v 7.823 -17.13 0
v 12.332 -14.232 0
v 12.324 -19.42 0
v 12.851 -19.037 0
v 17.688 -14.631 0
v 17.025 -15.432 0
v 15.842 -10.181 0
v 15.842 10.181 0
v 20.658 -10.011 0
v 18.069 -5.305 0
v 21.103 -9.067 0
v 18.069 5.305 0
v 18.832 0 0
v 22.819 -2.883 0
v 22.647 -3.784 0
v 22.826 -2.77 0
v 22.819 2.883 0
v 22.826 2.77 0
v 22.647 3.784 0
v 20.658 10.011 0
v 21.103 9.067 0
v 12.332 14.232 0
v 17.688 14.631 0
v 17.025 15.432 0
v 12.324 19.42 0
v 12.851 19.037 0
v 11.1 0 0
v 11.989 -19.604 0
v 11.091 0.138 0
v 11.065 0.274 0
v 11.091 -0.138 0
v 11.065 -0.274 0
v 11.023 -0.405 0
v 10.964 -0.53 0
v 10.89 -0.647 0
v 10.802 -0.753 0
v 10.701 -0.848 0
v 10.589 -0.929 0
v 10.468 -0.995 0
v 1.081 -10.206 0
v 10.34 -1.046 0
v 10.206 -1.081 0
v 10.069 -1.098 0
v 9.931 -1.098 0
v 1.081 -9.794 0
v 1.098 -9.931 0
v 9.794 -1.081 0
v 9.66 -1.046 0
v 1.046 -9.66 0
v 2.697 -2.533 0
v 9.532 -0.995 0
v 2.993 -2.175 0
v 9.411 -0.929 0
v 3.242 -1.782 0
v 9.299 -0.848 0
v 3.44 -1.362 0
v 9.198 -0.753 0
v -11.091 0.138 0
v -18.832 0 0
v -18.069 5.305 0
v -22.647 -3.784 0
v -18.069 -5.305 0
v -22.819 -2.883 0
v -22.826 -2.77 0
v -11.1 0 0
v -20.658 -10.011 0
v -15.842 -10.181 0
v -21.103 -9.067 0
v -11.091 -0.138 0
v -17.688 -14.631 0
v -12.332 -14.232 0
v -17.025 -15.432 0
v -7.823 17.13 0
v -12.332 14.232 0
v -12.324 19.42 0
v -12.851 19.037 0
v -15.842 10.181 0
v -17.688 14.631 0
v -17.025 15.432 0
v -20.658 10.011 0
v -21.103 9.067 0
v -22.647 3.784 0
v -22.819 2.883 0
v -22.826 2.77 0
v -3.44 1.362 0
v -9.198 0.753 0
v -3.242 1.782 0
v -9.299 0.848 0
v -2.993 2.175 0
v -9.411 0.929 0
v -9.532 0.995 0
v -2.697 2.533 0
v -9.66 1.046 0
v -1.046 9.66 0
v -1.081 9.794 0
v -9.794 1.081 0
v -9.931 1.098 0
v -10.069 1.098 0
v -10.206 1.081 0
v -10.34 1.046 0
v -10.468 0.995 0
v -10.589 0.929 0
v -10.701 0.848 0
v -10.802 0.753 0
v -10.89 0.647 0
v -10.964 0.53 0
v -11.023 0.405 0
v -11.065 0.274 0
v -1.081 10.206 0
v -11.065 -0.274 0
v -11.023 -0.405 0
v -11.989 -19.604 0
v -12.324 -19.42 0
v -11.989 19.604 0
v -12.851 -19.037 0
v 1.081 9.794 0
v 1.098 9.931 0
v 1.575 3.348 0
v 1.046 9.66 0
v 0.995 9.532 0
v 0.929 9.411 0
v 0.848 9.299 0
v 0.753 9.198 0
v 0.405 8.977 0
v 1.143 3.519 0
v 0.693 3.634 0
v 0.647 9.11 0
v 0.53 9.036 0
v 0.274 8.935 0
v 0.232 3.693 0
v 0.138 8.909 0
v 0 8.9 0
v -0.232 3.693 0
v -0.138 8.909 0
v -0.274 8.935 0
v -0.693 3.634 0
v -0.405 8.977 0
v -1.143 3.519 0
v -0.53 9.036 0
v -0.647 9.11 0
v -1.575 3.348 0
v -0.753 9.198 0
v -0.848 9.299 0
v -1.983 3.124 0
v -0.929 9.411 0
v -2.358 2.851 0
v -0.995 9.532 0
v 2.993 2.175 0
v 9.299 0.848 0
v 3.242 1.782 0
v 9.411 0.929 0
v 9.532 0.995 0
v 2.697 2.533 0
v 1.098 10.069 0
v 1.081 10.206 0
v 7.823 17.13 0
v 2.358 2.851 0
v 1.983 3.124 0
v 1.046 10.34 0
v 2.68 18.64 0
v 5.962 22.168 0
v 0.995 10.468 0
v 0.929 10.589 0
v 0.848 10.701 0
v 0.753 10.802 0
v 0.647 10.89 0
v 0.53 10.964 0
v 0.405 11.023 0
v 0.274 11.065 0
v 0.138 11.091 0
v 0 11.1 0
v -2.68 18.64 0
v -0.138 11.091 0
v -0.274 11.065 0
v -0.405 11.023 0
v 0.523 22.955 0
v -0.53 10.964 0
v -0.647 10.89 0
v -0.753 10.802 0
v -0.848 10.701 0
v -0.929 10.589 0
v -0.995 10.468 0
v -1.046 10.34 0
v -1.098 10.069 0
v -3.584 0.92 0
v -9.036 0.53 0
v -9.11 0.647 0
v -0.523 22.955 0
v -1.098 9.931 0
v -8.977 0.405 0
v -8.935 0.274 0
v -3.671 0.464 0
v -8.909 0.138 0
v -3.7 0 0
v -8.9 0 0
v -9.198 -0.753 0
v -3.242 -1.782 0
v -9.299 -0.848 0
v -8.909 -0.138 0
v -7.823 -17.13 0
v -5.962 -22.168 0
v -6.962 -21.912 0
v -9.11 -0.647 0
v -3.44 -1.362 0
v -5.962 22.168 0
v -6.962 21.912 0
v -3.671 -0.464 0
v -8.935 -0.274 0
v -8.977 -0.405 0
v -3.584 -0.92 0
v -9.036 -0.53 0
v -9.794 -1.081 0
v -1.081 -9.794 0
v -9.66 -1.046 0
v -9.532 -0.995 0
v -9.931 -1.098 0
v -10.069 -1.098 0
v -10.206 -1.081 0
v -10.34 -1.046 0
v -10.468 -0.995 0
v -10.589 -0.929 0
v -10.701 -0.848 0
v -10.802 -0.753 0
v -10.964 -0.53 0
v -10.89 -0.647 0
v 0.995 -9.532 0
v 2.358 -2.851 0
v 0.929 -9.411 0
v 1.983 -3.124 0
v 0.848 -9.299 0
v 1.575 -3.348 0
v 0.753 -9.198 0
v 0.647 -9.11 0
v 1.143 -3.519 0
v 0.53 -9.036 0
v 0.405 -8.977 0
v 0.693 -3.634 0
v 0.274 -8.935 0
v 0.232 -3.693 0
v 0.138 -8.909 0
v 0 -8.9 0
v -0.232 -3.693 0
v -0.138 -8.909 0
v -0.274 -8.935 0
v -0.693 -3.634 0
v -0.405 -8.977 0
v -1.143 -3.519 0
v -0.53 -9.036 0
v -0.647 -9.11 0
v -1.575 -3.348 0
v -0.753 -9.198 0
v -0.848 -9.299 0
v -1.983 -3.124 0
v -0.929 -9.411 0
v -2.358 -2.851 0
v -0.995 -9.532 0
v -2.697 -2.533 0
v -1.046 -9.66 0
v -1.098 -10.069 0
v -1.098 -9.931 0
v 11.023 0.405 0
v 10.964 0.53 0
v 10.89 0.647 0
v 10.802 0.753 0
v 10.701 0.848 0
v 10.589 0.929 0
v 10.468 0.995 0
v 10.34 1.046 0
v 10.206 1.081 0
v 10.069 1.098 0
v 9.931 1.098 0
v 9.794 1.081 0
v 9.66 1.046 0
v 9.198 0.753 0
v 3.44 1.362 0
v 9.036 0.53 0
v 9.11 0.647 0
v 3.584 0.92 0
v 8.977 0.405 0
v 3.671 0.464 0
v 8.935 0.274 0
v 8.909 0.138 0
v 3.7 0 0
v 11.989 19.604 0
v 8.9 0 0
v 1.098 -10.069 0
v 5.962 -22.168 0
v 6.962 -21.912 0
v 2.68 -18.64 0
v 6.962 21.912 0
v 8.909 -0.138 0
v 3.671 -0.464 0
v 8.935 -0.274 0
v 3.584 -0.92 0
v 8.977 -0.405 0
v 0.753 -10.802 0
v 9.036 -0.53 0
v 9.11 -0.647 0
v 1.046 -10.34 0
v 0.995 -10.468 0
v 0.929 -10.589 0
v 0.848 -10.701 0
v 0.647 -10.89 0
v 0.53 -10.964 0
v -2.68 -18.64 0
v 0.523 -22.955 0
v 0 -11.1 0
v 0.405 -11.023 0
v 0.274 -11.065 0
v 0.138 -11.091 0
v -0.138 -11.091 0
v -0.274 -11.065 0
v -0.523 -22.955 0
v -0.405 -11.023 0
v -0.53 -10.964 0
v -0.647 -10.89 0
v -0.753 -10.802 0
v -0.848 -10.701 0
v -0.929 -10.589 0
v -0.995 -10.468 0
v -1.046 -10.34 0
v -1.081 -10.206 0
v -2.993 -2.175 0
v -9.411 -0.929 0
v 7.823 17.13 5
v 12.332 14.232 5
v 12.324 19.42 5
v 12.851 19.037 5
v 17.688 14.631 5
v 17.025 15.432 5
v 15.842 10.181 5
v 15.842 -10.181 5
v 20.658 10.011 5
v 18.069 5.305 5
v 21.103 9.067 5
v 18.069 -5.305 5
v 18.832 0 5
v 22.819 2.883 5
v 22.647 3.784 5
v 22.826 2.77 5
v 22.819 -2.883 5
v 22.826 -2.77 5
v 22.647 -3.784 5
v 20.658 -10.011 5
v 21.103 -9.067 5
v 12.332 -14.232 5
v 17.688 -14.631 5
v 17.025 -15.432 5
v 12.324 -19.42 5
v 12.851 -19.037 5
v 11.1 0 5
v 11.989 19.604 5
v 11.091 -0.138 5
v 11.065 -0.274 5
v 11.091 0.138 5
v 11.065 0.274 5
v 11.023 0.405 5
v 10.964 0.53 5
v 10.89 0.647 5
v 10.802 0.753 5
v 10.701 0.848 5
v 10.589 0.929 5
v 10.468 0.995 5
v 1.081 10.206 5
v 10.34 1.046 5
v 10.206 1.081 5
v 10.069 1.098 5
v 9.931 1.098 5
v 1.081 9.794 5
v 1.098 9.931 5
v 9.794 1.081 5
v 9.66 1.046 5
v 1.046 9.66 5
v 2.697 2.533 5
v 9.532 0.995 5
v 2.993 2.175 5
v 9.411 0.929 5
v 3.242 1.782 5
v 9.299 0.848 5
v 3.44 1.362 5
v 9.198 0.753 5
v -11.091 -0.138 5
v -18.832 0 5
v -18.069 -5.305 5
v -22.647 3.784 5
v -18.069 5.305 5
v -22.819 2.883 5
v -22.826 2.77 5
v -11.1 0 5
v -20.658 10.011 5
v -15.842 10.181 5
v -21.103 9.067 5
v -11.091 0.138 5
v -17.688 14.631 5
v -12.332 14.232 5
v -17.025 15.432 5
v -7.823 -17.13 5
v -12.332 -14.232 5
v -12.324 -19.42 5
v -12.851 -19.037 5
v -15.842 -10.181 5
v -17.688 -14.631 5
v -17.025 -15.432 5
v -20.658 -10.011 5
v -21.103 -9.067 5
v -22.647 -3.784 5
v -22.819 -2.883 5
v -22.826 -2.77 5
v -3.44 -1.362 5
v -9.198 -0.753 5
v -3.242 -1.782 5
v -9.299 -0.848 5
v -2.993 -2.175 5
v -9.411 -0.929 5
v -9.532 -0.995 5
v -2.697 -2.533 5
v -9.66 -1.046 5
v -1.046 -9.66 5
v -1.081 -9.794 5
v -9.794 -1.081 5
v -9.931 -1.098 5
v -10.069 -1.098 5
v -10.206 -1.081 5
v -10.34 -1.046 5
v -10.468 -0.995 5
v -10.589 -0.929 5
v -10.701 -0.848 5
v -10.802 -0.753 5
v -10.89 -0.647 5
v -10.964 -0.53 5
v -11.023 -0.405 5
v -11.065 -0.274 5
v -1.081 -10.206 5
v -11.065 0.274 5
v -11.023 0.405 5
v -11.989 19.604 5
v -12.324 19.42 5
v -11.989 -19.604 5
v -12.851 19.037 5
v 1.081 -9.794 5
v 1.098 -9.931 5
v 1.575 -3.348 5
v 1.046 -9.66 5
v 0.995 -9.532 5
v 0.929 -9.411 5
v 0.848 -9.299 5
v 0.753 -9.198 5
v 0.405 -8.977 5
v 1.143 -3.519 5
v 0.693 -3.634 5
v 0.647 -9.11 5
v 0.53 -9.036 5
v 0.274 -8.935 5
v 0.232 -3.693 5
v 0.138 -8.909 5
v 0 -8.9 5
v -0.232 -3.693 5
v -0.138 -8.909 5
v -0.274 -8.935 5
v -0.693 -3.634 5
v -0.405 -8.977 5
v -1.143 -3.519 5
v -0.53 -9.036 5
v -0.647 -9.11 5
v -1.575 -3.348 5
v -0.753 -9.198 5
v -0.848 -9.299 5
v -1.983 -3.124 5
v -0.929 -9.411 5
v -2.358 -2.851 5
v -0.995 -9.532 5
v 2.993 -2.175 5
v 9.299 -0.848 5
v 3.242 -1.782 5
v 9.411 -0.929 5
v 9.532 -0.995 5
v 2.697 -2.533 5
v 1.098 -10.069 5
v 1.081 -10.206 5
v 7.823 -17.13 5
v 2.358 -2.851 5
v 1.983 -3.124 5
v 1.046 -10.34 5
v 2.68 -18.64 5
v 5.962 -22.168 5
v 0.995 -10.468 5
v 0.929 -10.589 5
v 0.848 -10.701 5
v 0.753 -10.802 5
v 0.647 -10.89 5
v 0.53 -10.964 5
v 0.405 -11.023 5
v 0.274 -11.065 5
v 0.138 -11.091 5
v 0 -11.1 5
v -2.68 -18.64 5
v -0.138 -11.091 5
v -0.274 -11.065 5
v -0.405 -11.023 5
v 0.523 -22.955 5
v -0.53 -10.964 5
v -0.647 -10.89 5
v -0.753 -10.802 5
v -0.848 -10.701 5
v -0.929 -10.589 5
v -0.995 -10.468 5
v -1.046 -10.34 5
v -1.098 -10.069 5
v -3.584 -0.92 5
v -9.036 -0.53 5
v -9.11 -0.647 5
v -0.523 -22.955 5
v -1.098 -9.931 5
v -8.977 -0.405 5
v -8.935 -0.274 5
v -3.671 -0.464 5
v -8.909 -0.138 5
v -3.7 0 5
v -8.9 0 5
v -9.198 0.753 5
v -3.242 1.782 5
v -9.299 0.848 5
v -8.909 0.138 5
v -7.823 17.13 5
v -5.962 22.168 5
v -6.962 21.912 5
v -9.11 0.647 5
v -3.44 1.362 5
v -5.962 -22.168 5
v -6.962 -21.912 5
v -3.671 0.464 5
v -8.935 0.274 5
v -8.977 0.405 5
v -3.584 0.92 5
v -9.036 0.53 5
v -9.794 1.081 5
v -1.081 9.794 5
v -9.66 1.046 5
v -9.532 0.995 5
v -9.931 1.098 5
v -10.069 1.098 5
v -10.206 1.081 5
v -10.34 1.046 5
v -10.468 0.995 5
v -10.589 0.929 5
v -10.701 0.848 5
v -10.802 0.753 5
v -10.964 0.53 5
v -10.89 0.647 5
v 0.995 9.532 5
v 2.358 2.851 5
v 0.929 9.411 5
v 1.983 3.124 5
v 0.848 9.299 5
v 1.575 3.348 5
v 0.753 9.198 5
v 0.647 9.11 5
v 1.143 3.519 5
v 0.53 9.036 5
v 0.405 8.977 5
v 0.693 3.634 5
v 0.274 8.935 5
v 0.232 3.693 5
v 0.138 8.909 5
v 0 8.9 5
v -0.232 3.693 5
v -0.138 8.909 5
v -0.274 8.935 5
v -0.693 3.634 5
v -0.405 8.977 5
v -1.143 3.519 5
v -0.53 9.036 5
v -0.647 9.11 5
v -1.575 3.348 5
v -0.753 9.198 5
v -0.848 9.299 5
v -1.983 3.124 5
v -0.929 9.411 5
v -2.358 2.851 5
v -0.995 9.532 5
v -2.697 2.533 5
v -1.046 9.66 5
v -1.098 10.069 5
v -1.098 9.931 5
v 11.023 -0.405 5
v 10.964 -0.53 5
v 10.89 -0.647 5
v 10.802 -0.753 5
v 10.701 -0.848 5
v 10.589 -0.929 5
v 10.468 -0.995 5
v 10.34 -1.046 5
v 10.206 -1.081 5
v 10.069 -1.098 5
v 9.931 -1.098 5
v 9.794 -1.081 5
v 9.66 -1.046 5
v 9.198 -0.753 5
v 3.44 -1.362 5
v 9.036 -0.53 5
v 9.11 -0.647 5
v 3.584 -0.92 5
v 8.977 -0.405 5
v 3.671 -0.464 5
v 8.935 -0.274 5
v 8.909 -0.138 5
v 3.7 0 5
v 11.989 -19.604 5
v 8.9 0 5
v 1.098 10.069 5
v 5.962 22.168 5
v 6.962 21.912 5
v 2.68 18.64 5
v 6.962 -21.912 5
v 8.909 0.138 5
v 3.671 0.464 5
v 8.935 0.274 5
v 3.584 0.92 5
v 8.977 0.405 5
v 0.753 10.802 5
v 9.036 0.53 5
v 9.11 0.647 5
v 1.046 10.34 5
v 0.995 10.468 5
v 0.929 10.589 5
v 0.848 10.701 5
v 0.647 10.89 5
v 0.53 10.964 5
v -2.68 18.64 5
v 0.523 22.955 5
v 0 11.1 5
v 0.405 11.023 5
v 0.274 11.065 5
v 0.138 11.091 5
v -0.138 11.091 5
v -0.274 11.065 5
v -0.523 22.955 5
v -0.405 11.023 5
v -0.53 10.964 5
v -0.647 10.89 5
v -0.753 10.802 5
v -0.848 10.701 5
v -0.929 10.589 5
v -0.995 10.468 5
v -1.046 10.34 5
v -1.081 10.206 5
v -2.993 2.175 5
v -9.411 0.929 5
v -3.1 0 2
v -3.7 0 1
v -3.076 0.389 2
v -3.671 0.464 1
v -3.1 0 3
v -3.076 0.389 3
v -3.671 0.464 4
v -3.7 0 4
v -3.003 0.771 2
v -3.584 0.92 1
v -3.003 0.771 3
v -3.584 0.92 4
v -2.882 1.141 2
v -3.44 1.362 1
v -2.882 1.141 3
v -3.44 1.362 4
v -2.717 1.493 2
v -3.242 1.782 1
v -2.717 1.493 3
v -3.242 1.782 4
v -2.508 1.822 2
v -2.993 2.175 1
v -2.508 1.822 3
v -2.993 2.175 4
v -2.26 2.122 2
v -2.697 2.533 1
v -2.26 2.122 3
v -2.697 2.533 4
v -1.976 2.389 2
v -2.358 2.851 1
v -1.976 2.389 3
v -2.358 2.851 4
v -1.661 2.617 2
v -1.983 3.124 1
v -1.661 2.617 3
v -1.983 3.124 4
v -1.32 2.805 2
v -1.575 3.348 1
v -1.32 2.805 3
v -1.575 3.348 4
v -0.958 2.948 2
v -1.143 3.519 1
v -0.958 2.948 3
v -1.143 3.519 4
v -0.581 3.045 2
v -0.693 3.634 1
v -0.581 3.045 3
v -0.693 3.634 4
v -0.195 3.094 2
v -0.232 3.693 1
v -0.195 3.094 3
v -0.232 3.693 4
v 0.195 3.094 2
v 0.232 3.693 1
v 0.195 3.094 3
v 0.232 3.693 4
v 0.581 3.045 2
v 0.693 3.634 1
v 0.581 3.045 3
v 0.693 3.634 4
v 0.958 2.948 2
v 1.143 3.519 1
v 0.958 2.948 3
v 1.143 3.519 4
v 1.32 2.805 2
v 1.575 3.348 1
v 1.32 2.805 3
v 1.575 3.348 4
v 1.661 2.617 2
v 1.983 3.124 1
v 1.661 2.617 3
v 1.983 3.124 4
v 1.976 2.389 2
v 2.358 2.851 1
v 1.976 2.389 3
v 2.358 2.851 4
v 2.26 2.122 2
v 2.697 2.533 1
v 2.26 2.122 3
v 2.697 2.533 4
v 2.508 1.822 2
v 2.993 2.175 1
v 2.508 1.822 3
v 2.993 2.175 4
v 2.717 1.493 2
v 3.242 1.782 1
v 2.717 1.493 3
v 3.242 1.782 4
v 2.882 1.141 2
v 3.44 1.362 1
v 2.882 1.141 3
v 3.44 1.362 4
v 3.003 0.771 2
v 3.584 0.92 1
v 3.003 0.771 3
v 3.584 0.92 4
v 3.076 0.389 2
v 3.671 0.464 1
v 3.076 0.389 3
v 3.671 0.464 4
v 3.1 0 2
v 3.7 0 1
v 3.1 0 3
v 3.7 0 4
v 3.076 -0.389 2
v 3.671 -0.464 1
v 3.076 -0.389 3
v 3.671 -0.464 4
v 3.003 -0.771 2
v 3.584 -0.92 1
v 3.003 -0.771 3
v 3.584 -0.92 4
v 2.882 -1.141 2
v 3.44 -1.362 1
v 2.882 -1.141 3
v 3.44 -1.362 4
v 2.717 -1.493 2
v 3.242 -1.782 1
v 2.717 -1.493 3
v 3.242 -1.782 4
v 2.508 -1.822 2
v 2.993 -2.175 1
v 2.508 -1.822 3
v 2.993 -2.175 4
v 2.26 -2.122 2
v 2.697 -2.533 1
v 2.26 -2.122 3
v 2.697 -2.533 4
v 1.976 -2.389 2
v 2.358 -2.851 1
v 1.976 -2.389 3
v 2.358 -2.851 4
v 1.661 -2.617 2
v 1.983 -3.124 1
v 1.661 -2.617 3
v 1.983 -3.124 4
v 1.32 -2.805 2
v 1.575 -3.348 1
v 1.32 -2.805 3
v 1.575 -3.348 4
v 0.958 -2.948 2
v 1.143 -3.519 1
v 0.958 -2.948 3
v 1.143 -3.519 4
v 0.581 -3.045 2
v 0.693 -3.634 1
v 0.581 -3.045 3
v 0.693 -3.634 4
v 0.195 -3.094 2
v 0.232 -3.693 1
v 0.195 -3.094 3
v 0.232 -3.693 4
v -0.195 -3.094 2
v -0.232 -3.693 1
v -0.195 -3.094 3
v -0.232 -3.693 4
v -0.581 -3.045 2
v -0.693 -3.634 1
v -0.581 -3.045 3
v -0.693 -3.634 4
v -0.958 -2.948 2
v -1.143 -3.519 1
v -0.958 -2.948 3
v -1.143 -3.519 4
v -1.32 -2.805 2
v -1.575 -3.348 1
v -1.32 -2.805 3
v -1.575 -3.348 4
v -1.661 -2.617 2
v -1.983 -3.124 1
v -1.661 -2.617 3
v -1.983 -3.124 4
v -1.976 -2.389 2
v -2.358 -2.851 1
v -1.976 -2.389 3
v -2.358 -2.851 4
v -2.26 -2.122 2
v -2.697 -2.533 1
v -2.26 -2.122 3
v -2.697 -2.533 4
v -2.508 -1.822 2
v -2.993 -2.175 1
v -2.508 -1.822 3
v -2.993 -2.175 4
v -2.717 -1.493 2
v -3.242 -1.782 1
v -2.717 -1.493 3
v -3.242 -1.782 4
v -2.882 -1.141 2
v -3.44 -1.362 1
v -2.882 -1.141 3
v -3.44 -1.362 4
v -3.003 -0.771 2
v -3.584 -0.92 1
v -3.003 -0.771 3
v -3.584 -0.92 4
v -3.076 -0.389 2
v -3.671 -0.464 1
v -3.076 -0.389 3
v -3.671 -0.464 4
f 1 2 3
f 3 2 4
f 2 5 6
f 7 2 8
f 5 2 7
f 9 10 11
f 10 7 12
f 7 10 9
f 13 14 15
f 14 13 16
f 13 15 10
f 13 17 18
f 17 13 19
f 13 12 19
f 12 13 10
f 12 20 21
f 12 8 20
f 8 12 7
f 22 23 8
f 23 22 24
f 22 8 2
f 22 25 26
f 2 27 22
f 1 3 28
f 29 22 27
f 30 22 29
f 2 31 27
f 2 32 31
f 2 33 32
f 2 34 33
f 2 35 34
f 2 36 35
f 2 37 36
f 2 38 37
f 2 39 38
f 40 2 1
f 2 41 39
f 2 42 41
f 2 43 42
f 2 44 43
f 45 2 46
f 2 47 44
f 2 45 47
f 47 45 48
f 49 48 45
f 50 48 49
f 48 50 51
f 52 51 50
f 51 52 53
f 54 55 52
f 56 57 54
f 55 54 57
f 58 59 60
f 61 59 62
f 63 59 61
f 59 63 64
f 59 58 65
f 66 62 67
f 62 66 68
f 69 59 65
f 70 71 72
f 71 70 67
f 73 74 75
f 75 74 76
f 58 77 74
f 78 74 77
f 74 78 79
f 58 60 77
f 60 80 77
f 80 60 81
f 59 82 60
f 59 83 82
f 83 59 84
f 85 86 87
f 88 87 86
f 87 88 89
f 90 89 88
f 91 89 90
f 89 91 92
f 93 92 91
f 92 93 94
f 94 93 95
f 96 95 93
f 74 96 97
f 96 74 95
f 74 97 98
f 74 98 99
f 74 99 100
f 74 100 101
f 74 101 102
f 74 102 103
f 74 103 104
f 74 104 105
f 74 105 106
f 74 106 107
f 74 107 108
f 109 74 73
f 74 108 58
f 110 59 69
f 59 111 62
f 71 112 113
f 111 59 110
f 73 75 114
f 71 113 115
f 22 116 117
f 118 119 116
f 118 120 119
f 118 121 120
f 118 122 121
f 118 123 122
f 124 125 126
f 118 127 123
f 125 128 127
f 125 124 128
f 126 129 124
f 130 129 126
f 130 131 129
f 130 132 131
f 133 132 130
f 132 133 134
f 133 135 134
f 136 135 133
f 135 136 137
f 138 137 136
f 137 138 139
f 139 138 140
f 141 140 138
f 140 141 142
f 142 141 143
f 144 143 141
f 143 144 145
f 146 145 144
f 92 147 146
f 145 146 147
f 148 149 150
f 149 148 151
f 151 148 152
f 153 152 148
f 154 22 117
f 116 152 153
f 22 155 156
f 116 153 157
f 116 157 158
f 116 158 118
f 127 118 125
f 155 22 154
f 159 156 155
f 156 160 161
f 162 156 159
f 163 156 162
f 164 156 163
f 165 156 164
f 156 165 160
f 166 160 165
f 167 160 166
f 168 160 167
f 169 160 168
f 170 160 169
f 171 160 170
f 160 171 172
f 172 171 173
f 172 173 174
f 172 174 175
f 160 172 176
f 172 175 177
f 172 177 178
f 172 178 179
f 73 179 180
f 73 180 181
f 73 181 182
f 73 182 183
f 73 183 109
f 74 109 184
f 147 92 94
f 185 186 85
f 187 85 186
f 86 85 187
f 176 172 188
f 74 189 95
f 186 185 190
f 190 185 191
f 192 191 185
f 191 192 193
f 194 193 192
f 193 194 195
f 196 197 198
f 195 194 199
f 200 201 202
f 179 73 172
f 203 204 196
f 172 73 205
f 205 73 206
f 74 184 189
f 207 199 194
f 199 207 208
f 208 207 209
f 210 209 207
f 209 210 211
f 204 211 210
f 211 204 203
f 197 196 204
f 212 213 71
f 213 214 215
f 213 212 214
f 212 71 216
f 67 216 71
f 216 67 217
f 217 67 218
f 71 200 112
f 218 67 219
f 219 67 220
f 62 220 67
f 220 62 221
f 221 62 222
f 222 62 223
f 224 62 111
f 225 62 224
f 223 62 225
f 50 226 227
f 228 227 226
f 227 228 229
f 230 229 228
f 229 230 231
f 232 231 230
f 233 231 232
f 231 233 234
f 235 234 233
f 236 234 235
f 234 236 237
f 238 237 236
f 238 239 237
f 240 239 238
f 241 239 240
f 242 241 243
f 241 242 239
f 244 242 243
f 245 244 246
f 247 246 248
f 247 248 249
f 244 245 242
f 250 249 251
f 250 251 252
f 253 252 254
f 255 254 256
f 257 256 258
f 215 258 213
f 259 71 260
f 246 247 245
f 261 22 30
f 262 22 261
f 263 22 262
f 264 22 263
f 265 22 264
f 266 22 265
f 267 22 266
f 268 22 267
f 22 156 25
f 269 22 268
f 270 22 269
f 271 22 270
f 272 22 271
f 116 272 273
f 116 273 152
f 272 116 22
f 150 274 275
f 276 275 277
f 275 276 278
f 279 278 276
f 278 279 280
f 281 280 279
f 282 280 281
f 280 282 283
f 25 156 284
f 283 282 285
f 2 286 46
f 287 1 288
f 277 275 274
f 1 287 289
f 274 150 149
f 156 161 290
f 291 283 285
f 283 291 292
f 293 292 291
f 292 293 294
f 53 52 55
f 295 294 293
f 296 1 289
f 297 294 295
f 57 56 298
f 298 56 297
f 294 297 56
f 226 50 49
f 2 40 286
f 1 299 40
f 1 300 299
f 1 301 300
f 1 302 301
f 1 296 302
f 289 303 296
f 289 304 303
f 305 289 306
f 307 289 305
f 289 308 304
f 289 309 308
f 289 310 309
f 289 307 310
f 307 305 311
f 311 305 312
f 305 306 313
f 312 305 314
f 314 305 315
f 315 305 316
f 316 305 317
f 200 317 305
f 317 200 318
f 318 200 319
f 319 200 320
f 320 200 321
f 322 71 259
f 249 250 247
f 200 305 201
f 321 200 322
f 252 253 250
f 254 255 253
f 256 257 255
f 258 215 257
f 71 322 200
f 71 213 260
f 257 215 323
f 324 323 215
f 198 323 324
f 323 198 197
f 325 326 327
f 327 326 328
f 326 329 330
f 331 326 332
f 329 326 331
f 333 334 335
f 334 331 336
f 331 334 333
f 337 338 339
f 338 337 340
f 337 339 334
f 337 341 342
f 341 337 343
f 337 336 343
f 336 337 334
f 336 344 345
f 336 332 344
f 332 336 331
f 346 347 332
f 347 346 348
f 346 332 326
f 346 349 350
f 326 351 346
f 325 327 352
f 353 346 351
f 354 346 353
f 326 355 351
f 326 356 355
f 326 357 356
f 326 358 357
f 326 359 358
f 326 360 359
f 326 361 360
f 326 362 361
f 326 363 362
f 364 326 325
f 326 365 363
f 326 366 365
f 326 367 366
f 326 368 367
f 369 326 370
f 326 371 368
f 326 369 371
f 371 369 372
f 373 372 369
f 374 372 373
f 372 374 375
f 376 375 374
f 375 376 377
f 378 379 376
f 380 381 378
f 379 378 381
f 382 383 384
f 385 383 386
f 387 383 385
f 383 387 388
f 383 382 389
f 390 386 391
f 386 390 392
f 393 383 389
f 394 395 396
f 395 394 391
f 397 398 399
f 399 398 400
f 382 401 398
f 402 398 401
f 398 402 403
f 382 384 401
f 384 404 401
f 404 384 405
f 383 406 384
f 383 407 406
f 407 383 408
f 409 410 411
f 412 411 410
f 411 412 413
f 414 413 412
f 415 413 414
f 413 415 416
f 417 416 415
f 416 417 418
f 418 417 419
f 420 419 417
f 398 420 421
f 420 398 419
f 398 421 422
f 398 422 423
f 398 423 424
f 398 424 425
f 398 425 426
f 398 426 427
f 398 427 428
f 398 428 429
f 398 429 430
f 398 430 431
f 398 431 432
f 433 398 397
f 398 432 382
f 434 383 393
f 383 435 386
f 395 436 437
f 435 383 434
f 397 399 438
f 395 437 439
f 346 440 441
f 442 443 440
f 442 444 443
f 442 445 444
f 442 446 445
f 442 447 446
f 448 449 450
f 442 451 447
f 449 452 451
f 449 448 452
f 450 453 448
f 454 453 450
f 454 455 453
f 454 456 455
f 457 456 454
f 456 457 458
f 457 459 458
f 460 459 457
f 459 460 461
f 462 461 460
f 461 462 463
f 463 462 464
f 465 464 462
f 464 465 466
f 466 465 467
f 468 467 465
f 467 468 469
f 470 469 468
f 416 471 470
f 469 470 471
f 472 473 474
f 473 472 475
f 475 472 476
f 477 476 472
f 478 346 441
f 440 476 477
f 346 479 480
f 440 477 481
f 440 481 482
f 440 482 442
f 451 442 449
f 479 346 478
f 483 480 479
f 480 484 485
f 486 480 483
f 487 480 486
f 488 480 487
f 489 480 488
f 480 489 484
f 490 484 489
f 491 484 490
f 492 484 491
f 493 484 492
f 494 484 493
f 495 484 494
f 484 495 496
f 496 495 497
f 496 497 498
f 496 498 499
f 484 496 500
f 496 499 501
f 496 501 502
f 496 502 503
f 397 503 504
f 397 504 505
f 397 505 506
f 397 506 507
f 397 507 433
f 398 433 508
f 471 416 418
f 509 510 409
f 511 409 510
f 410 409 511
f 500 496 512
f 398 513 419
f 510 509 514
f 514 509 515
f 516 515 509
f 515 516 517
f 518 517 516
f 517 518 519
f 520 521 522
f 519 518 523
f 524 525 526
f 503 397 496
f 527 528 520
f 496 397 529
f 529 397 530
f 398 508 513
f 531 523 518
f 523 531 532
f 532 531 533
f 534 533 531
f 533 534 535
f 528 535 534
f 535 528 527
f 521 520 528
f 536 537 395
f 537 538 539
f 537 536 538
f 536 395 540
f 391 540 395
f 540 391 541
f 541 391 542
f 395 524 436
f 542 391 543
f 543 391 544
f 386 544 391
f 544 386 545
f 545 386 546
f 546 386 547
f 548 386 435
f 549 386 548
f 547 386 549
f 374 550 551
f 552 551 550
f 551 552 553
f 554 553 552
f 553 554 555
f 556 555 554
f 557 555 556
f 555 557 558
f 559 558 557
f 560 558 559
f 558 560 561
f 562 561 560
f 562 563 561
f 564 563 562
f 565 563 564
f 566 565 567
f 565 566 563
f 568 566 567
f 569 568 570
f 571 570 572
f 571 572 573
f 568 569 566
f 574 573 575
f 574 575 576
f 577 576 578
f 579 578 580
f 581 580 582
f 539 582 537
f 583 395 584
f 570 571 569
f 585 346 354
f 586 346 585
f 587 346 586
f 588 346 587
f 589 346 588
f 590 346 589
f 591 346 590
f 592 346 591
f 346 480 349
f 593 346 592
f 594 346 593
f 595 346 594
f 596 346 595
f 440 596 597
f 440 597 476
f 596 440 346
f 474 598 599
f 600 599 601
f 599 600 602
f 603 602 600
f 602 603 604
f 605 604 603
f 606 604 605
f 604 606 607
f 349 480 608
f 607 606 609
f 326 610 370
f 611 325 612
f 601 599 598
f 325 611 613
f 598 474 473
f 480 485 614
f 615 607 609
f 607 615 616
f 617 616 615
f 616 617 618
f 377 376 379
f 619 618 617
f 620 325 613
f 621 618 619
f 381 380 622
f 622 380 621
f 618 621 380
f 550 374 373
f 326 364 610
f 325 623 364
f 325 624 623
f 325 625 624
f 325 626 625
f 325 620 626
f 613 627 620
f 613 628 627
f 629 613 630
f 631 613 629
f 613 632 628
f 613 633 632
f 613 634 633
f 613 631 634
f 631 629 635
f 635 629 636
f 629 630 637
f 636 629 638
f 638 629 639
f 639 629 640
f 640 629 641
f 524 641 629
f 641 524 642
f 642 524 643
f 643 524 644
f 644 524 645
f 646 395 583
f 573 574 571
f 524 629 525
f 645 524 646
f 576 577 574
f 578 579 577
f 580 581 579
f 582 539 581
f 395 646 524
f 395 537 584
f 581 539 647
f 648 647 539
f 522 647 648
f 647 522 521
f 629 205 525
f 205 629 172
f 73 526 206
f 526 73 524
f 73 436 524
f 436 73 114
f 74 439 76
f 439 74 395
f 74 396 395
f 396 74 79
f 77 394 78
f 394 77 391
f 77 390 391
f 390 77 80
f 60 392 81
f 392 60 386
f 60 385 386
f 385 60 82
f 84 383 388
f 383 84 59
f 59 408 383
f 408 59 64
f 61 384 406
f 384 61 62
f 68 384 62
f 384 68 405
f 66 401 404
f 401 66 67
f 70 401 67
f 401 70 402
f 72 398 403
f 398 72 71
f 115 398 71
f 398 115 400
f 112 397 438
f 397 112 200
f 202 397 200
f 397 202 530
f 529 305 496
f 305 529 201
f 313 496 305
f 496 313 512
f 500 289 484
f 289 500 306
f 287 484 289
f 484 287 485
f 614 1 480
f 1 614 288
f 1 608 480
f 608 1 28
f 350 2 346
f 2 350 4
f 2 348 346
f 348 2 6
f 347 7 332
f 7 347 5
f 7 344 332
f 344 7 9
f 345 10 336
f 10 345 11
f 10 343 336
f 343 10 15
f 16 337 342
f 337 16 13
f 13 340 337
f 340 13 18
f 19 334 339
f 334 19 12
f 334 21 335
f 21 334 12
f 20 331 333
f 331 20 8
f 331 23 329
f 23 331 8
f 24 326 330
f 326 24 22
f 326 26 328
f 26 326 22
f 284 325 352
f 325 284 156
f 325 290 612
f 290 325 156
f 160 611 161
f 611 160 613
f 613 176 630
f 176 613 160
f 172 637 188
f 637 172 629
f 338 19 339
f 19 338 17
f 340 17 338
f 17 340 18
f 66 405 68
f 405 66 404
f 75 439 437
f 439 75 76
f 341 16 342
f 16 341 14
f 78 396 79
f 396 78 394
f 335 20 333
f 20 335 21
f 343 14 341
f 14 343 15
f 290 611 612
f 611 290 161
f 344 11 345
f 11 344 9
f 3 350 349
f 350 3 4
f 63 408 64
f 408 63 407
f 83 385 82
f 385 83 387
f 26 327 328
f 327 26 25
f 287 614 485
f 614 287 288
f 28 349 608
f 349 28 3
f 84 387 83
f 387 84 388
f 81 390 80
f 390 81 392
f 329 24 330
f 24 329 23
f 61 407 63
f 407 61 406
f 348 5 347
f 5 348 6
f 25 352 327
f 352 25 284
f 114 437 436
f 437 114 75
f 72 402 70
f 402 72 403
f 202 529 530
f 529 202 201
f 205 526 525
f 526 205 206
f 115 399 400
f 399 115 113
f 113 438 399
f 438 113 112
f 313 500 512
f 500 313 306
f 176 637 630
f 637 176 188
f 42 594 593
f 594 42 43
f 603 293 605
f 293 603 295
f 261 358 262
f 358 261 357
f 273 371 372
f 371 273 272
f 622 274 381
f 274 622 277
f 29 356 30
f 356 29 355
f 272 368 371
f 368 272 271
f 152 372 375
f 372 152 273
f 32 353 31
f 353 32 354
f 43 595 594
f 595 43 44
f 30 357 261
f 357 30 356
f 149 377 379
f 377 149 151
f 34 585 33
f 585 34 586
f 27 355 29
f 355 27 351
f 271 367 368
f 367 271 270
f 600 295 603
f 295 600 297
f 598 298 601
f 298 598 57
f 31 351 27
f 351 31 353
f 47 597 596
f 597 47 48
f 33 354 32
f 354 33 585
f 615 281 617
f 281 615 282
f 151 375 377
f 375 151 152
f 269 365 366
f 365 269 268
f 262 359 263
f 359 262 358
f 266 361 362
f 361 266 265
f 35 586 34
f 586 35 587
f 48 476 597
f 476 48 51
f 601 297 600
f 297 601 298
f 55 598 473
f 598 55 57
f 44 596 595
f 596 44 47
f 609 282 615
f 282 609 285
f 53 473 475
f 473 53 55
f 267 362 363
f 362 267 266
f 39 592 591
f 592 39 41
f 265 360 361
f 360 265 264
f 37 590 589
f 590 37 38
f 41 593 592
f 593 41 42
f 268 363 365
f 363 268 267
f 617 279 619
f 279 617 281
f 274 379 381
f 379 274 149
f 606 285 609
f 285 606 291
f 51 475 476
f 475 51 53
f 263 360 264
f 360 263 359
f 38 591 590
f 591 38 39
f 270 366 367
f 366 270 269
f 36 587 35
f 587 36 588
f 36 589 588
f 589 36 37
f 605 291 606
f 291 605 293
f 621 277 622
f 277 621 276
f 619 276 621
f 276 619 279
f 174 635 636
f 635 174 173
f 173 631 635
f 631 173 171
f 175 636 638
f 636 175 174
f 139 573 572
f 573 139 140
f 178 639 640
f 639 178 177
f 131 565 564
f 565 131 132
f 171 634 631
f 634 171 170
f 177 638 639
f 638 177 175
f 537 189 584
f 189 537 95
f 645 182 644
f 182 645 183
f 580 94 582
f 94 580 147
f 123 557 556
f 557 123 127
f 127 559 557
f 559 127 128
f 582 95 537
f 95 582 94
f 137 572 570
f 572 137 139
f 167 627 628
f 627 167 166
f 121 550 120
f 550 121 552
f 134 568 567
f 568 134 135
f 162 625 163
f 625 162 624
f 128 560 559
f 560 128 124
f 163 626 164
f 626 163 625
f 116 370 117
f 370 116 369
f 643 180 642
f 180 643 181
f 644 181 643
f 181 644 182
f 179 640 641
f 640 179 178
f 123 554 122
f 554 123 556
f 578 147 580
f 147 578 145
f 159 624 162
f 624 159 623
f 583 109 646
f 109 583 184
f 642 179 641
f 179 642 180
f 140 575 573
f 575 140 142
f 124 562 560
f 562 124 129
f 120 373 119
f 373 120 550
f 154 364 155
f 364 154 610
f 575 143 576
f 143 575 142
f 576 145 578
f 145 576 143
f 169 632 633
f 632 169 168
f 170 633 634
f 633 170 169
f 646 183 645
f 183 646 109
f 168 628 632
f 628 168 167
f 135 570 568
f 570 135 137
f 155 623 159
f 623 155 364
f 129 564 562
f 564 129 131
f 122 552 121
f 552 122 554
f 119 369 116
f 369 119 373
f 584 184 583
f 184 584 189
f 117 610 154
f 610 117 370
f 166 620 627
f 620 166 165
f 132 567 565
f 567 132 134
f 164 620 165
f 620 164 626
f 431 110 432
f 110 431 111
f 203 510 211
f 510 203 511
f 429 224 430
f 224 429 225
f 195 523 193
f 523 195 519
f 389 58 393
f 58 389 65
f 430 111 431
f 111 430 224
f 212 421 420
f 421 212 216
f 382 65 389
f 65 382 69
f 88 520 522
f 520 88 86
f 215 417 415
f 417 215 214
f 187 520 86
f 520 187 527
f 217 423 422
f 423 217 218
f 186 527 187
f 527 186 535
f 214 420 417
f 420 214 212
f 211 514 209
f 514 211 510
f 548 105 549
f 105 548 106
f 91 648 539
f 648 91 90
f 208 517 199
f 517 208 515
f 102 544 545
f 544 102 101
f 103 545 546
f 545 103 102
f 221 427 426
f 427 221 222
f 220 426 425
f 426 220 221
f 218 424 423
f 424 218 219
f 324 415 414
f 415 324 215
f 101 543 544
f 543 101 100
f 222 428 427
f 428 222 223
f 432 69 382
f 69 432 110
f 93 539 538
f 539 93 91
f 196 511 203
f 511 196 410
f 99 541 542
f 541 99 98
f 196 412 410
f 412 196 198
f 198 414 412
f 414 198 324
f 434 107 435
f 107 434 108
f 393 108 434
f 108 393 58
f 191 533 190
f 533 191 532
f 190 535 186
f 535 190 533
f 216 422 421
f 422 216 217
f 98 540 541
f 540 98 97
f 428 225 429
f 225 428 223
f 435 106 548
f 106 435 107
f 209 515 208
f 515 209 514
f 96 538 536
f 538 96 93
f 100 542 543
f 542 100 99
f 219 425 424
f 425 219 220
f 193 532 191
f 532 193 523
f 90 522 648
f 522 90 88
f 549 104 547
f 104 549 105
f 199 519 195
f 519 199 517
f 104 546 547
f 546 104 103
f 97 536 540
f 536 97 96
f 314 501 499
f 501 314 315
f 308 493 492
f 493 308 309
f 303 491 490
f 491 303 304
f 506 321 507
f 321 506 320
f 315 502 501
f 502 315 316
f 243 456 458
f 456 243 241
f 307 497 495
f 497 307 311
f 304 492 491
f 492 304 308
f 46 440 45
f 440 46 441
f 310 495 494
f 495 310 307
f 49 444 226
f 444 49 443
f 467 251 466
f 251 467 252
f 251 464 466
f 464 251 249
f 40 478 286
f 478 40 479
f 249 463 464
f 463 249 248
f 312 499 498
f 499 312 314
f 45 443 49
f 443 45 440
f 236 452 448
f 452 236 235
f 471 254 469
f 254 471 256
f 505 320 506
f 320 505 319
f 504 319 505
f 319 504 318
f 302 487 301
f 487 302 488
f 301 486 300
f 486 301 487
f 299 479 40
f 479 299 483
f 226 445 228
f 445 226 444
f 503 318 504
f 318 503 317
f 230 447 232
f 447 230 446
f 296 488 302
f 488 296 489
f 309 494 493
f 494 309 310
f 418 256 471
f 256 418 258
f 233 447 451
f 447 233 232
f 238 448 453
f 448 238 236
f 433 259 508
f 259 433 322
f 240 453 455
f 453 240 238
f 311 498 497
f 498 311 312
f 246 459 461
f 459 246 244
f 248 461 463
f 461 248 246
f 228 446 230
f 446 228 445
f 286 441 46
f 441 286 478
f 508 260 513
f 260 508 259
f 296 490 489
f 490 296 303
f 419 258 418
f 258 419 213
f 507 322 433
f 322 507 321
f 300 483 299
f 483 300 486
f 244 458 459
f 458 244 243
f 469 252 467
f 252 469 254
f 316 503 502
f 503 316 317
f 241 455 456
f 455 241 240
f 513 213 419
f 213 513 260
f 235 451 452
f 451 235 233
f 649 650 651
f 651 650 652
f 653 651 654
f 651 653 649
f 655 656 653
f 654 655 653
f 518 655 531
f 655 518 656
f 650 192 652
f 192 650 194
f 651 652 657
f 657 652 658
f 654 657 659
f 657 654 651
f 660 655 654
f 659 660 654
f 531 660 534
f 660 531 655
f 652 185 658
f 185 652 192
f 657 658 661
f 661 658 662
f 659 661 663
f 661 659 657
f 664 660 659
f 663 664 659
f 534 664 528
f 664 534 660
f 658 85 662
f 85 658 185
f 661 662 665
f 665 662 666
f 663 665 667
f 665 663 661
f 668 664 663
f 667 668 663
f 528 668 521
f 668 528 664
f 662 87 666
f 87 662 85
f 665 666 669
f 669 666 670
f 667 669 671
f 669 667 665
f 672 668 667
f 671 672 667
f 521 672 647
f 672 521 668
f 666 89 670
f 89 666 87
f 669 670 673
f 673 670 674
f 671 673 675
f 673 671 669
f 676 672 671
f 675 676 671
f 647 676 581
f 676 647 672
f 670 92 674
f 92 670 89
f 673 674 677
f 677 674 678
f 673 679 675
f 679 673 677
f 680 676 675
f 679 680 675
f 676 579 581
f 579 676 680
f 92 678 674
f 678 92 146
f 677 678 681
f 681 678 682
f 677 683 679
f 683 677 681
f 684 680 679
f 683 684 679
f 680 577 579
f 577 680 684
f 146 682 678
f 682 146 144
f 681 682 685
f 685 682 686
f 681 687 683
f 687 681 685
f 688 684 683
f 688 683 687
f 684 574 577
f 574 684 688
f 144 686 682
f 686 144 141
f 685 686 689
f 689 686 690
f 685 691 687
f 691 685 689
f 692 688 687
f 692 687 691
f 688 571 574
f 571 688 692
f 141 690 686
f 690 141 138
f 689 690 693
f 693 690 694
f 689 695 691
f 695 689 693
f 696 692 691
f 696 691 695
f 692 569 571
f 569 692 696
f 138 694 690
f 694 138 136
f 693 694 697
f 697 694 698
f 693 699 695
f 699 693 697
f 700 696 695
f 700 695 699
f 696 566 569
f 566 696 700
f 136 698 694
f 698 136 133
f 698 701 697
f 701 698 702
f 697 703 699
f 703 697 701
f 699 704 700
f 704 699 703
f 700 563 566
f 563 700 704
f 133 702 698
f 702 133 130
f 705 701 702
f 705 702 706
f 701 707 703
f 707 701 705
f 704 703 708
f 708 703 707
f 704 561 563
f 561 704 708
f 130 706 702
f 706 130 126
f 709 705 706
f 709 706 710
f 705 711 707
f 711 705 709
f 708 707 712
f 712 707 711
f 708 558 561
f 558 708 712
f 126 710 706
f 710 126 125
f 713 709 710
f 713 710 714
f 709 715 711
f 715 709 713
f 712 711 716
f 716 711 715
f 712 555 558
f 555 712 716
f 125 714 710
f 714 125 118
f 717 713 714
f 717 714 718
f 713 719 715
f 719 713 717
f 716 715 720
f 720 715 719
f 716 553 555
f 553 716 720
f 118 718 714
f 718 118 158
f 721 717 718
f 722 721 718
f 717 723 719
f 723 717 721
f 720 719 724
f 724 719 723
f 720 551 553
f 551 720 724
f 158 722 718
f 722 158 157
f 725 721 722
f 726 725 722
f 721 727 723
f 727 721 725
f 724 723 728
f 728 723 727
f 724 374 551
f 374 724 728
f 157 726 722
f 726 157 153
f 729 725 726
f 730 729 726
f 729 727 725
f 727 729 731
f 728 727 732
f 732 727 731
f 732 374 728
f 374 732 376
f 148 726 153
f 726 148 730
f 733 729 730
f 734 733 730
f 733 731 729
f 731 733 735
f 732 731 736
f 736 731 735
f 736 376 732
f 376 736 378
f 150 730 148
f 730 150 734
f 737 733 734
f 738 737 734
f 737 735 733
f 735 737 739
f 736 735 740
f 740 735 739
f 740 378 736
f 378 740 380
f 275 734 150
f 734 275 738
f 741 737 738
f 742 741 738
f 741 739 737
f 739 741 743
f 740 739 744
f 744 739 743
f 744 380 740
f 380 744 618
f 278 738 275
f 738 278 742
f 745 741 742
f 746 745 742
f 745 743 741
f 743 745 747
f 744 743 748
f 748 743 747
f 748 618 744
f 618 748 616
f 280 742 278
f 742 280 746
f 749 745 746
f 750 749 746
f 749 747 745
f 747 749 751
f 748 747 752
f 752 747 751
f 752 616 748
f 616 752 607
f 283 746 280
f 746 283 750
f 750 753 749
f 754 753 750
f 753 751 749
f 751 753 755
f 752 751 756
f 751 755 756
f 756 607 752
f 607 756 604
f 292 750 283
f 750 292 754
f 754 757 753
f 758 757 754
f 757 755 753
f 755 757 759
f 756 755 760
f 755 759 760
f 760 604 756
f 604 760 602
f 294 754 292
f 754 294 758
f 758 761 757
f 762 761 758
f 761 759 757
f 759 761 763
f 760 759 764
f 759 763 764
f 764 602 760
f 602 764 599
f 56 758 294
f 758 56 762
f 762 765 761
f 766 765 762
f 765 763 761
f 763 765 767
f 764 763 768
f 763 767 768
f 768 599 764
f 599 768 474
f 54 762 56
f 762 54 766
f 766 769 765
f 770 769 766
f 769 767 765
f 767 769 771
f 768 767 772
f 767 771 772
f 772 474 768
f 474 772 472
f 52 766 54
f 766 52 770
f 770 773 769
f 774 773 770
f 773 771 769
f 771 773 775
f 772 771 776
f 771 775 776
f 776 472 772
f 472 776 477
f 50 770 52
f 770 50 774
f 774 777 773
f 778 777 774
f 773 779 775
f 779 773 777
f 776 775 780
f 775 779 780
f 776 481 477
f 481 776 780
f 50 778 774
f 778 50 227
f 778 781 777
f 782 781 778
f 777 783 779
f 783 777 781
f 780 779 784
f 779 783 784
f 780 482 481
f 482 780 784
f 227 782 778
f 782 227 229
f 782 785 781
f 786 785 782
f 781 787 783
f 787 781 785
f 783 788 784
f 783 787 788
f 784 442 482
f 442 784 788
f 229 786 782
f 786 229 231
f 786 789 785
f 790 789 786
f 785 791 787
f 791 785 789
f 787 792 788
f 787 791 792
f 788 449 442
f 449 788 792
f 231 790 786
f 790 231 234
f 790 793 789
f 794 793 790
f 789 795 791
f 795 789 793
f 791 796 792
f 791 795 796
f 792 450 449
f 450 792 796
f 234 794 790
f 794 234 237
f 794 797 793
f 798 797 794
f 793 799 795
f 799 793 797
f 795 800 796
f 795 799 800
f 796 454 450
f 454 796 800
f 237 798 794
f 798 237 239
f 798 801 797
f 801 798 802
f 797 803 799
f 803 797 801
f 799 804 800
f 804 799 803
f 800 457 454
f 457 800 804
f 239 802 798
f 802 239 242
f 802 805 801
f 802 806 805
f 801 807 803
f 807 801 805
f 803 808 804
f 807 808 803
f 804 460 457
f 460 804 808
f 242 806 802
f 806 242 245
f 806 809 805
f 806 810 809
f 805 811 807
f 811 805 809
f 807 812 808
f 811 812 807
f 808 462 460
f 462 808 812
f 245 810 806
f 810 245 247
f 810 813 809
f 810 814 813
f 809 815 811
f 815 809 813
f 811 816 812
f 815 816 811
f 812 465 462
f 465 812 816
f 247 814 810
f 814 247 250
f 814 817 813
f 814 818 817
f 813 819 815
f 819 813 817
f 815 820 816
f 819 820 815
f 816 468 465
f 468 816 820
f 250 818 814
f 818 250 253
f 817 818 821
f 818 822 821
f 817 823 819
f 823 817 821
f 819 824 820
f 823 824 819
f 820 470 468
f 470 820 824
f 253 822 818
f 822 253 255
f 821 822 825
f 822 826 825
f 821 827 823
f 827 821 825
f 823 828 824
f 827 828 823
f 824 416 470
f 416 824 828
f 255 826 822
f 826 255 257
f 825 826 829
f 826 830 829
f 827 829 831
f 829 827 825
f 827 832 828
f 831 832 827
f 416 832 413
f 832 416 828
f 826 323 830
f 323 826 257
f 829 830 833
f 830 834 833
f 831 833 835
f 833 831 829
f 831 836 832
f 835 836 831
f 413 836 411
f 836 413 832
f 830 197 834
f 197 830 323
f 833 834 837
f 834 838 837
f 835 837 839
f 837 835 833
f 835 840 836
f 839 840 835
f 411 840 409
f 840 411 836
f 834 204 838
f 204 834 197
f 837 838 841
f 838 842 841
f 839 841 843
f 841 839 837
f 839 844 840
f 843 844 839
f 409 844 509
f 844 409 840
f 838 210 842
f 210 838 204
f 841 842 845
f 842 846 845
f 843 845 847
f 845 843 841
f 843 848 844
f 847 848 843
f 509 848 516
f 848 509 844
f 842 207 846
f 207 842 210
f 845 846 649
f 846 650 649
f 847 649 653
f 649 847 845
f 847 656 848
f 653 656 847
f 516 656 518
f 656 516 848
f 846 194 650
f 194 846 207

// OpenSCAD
$fn = 50;

height = 5;
radius = 24;
holeRadius = 3.1;
holeChamfer = .6;
teeth = ceil(radius) - 2;

difference() {
  intersection() {
    for (a = [1:teeth]) {
      rotate([0, 0, a * 360 / teeth]) {
        linear_extrude(height) {
          polygon(
            [
              [-radius / 2, 0],
              [0, radius],
              [radius / 2, 0],
            ]
          );
        }
      }
    }

    cylinder(r=radius - 1, h=height);
  }

  rotate_extrude() {
    polygon(
      [
        [0, 0],
        [holeRadius + holeChamfer, 0],
        [holeRadius + holeChamfer, 1],
        [holeRadius, 2],
        [holeRadius, height - 2],
        [holeRadius + holeChamfer, height - 1],
        [holeRadius + holeChamfer, height],
        [0, height],
      ]
    );
  }

  if (radius >= 18) {
    for (a = [0:3]) {
      rotate([0, 0, a * 90]) translate([10, 0, 0]) cylinder(r=1.1, h=height);
    }
  }
}
